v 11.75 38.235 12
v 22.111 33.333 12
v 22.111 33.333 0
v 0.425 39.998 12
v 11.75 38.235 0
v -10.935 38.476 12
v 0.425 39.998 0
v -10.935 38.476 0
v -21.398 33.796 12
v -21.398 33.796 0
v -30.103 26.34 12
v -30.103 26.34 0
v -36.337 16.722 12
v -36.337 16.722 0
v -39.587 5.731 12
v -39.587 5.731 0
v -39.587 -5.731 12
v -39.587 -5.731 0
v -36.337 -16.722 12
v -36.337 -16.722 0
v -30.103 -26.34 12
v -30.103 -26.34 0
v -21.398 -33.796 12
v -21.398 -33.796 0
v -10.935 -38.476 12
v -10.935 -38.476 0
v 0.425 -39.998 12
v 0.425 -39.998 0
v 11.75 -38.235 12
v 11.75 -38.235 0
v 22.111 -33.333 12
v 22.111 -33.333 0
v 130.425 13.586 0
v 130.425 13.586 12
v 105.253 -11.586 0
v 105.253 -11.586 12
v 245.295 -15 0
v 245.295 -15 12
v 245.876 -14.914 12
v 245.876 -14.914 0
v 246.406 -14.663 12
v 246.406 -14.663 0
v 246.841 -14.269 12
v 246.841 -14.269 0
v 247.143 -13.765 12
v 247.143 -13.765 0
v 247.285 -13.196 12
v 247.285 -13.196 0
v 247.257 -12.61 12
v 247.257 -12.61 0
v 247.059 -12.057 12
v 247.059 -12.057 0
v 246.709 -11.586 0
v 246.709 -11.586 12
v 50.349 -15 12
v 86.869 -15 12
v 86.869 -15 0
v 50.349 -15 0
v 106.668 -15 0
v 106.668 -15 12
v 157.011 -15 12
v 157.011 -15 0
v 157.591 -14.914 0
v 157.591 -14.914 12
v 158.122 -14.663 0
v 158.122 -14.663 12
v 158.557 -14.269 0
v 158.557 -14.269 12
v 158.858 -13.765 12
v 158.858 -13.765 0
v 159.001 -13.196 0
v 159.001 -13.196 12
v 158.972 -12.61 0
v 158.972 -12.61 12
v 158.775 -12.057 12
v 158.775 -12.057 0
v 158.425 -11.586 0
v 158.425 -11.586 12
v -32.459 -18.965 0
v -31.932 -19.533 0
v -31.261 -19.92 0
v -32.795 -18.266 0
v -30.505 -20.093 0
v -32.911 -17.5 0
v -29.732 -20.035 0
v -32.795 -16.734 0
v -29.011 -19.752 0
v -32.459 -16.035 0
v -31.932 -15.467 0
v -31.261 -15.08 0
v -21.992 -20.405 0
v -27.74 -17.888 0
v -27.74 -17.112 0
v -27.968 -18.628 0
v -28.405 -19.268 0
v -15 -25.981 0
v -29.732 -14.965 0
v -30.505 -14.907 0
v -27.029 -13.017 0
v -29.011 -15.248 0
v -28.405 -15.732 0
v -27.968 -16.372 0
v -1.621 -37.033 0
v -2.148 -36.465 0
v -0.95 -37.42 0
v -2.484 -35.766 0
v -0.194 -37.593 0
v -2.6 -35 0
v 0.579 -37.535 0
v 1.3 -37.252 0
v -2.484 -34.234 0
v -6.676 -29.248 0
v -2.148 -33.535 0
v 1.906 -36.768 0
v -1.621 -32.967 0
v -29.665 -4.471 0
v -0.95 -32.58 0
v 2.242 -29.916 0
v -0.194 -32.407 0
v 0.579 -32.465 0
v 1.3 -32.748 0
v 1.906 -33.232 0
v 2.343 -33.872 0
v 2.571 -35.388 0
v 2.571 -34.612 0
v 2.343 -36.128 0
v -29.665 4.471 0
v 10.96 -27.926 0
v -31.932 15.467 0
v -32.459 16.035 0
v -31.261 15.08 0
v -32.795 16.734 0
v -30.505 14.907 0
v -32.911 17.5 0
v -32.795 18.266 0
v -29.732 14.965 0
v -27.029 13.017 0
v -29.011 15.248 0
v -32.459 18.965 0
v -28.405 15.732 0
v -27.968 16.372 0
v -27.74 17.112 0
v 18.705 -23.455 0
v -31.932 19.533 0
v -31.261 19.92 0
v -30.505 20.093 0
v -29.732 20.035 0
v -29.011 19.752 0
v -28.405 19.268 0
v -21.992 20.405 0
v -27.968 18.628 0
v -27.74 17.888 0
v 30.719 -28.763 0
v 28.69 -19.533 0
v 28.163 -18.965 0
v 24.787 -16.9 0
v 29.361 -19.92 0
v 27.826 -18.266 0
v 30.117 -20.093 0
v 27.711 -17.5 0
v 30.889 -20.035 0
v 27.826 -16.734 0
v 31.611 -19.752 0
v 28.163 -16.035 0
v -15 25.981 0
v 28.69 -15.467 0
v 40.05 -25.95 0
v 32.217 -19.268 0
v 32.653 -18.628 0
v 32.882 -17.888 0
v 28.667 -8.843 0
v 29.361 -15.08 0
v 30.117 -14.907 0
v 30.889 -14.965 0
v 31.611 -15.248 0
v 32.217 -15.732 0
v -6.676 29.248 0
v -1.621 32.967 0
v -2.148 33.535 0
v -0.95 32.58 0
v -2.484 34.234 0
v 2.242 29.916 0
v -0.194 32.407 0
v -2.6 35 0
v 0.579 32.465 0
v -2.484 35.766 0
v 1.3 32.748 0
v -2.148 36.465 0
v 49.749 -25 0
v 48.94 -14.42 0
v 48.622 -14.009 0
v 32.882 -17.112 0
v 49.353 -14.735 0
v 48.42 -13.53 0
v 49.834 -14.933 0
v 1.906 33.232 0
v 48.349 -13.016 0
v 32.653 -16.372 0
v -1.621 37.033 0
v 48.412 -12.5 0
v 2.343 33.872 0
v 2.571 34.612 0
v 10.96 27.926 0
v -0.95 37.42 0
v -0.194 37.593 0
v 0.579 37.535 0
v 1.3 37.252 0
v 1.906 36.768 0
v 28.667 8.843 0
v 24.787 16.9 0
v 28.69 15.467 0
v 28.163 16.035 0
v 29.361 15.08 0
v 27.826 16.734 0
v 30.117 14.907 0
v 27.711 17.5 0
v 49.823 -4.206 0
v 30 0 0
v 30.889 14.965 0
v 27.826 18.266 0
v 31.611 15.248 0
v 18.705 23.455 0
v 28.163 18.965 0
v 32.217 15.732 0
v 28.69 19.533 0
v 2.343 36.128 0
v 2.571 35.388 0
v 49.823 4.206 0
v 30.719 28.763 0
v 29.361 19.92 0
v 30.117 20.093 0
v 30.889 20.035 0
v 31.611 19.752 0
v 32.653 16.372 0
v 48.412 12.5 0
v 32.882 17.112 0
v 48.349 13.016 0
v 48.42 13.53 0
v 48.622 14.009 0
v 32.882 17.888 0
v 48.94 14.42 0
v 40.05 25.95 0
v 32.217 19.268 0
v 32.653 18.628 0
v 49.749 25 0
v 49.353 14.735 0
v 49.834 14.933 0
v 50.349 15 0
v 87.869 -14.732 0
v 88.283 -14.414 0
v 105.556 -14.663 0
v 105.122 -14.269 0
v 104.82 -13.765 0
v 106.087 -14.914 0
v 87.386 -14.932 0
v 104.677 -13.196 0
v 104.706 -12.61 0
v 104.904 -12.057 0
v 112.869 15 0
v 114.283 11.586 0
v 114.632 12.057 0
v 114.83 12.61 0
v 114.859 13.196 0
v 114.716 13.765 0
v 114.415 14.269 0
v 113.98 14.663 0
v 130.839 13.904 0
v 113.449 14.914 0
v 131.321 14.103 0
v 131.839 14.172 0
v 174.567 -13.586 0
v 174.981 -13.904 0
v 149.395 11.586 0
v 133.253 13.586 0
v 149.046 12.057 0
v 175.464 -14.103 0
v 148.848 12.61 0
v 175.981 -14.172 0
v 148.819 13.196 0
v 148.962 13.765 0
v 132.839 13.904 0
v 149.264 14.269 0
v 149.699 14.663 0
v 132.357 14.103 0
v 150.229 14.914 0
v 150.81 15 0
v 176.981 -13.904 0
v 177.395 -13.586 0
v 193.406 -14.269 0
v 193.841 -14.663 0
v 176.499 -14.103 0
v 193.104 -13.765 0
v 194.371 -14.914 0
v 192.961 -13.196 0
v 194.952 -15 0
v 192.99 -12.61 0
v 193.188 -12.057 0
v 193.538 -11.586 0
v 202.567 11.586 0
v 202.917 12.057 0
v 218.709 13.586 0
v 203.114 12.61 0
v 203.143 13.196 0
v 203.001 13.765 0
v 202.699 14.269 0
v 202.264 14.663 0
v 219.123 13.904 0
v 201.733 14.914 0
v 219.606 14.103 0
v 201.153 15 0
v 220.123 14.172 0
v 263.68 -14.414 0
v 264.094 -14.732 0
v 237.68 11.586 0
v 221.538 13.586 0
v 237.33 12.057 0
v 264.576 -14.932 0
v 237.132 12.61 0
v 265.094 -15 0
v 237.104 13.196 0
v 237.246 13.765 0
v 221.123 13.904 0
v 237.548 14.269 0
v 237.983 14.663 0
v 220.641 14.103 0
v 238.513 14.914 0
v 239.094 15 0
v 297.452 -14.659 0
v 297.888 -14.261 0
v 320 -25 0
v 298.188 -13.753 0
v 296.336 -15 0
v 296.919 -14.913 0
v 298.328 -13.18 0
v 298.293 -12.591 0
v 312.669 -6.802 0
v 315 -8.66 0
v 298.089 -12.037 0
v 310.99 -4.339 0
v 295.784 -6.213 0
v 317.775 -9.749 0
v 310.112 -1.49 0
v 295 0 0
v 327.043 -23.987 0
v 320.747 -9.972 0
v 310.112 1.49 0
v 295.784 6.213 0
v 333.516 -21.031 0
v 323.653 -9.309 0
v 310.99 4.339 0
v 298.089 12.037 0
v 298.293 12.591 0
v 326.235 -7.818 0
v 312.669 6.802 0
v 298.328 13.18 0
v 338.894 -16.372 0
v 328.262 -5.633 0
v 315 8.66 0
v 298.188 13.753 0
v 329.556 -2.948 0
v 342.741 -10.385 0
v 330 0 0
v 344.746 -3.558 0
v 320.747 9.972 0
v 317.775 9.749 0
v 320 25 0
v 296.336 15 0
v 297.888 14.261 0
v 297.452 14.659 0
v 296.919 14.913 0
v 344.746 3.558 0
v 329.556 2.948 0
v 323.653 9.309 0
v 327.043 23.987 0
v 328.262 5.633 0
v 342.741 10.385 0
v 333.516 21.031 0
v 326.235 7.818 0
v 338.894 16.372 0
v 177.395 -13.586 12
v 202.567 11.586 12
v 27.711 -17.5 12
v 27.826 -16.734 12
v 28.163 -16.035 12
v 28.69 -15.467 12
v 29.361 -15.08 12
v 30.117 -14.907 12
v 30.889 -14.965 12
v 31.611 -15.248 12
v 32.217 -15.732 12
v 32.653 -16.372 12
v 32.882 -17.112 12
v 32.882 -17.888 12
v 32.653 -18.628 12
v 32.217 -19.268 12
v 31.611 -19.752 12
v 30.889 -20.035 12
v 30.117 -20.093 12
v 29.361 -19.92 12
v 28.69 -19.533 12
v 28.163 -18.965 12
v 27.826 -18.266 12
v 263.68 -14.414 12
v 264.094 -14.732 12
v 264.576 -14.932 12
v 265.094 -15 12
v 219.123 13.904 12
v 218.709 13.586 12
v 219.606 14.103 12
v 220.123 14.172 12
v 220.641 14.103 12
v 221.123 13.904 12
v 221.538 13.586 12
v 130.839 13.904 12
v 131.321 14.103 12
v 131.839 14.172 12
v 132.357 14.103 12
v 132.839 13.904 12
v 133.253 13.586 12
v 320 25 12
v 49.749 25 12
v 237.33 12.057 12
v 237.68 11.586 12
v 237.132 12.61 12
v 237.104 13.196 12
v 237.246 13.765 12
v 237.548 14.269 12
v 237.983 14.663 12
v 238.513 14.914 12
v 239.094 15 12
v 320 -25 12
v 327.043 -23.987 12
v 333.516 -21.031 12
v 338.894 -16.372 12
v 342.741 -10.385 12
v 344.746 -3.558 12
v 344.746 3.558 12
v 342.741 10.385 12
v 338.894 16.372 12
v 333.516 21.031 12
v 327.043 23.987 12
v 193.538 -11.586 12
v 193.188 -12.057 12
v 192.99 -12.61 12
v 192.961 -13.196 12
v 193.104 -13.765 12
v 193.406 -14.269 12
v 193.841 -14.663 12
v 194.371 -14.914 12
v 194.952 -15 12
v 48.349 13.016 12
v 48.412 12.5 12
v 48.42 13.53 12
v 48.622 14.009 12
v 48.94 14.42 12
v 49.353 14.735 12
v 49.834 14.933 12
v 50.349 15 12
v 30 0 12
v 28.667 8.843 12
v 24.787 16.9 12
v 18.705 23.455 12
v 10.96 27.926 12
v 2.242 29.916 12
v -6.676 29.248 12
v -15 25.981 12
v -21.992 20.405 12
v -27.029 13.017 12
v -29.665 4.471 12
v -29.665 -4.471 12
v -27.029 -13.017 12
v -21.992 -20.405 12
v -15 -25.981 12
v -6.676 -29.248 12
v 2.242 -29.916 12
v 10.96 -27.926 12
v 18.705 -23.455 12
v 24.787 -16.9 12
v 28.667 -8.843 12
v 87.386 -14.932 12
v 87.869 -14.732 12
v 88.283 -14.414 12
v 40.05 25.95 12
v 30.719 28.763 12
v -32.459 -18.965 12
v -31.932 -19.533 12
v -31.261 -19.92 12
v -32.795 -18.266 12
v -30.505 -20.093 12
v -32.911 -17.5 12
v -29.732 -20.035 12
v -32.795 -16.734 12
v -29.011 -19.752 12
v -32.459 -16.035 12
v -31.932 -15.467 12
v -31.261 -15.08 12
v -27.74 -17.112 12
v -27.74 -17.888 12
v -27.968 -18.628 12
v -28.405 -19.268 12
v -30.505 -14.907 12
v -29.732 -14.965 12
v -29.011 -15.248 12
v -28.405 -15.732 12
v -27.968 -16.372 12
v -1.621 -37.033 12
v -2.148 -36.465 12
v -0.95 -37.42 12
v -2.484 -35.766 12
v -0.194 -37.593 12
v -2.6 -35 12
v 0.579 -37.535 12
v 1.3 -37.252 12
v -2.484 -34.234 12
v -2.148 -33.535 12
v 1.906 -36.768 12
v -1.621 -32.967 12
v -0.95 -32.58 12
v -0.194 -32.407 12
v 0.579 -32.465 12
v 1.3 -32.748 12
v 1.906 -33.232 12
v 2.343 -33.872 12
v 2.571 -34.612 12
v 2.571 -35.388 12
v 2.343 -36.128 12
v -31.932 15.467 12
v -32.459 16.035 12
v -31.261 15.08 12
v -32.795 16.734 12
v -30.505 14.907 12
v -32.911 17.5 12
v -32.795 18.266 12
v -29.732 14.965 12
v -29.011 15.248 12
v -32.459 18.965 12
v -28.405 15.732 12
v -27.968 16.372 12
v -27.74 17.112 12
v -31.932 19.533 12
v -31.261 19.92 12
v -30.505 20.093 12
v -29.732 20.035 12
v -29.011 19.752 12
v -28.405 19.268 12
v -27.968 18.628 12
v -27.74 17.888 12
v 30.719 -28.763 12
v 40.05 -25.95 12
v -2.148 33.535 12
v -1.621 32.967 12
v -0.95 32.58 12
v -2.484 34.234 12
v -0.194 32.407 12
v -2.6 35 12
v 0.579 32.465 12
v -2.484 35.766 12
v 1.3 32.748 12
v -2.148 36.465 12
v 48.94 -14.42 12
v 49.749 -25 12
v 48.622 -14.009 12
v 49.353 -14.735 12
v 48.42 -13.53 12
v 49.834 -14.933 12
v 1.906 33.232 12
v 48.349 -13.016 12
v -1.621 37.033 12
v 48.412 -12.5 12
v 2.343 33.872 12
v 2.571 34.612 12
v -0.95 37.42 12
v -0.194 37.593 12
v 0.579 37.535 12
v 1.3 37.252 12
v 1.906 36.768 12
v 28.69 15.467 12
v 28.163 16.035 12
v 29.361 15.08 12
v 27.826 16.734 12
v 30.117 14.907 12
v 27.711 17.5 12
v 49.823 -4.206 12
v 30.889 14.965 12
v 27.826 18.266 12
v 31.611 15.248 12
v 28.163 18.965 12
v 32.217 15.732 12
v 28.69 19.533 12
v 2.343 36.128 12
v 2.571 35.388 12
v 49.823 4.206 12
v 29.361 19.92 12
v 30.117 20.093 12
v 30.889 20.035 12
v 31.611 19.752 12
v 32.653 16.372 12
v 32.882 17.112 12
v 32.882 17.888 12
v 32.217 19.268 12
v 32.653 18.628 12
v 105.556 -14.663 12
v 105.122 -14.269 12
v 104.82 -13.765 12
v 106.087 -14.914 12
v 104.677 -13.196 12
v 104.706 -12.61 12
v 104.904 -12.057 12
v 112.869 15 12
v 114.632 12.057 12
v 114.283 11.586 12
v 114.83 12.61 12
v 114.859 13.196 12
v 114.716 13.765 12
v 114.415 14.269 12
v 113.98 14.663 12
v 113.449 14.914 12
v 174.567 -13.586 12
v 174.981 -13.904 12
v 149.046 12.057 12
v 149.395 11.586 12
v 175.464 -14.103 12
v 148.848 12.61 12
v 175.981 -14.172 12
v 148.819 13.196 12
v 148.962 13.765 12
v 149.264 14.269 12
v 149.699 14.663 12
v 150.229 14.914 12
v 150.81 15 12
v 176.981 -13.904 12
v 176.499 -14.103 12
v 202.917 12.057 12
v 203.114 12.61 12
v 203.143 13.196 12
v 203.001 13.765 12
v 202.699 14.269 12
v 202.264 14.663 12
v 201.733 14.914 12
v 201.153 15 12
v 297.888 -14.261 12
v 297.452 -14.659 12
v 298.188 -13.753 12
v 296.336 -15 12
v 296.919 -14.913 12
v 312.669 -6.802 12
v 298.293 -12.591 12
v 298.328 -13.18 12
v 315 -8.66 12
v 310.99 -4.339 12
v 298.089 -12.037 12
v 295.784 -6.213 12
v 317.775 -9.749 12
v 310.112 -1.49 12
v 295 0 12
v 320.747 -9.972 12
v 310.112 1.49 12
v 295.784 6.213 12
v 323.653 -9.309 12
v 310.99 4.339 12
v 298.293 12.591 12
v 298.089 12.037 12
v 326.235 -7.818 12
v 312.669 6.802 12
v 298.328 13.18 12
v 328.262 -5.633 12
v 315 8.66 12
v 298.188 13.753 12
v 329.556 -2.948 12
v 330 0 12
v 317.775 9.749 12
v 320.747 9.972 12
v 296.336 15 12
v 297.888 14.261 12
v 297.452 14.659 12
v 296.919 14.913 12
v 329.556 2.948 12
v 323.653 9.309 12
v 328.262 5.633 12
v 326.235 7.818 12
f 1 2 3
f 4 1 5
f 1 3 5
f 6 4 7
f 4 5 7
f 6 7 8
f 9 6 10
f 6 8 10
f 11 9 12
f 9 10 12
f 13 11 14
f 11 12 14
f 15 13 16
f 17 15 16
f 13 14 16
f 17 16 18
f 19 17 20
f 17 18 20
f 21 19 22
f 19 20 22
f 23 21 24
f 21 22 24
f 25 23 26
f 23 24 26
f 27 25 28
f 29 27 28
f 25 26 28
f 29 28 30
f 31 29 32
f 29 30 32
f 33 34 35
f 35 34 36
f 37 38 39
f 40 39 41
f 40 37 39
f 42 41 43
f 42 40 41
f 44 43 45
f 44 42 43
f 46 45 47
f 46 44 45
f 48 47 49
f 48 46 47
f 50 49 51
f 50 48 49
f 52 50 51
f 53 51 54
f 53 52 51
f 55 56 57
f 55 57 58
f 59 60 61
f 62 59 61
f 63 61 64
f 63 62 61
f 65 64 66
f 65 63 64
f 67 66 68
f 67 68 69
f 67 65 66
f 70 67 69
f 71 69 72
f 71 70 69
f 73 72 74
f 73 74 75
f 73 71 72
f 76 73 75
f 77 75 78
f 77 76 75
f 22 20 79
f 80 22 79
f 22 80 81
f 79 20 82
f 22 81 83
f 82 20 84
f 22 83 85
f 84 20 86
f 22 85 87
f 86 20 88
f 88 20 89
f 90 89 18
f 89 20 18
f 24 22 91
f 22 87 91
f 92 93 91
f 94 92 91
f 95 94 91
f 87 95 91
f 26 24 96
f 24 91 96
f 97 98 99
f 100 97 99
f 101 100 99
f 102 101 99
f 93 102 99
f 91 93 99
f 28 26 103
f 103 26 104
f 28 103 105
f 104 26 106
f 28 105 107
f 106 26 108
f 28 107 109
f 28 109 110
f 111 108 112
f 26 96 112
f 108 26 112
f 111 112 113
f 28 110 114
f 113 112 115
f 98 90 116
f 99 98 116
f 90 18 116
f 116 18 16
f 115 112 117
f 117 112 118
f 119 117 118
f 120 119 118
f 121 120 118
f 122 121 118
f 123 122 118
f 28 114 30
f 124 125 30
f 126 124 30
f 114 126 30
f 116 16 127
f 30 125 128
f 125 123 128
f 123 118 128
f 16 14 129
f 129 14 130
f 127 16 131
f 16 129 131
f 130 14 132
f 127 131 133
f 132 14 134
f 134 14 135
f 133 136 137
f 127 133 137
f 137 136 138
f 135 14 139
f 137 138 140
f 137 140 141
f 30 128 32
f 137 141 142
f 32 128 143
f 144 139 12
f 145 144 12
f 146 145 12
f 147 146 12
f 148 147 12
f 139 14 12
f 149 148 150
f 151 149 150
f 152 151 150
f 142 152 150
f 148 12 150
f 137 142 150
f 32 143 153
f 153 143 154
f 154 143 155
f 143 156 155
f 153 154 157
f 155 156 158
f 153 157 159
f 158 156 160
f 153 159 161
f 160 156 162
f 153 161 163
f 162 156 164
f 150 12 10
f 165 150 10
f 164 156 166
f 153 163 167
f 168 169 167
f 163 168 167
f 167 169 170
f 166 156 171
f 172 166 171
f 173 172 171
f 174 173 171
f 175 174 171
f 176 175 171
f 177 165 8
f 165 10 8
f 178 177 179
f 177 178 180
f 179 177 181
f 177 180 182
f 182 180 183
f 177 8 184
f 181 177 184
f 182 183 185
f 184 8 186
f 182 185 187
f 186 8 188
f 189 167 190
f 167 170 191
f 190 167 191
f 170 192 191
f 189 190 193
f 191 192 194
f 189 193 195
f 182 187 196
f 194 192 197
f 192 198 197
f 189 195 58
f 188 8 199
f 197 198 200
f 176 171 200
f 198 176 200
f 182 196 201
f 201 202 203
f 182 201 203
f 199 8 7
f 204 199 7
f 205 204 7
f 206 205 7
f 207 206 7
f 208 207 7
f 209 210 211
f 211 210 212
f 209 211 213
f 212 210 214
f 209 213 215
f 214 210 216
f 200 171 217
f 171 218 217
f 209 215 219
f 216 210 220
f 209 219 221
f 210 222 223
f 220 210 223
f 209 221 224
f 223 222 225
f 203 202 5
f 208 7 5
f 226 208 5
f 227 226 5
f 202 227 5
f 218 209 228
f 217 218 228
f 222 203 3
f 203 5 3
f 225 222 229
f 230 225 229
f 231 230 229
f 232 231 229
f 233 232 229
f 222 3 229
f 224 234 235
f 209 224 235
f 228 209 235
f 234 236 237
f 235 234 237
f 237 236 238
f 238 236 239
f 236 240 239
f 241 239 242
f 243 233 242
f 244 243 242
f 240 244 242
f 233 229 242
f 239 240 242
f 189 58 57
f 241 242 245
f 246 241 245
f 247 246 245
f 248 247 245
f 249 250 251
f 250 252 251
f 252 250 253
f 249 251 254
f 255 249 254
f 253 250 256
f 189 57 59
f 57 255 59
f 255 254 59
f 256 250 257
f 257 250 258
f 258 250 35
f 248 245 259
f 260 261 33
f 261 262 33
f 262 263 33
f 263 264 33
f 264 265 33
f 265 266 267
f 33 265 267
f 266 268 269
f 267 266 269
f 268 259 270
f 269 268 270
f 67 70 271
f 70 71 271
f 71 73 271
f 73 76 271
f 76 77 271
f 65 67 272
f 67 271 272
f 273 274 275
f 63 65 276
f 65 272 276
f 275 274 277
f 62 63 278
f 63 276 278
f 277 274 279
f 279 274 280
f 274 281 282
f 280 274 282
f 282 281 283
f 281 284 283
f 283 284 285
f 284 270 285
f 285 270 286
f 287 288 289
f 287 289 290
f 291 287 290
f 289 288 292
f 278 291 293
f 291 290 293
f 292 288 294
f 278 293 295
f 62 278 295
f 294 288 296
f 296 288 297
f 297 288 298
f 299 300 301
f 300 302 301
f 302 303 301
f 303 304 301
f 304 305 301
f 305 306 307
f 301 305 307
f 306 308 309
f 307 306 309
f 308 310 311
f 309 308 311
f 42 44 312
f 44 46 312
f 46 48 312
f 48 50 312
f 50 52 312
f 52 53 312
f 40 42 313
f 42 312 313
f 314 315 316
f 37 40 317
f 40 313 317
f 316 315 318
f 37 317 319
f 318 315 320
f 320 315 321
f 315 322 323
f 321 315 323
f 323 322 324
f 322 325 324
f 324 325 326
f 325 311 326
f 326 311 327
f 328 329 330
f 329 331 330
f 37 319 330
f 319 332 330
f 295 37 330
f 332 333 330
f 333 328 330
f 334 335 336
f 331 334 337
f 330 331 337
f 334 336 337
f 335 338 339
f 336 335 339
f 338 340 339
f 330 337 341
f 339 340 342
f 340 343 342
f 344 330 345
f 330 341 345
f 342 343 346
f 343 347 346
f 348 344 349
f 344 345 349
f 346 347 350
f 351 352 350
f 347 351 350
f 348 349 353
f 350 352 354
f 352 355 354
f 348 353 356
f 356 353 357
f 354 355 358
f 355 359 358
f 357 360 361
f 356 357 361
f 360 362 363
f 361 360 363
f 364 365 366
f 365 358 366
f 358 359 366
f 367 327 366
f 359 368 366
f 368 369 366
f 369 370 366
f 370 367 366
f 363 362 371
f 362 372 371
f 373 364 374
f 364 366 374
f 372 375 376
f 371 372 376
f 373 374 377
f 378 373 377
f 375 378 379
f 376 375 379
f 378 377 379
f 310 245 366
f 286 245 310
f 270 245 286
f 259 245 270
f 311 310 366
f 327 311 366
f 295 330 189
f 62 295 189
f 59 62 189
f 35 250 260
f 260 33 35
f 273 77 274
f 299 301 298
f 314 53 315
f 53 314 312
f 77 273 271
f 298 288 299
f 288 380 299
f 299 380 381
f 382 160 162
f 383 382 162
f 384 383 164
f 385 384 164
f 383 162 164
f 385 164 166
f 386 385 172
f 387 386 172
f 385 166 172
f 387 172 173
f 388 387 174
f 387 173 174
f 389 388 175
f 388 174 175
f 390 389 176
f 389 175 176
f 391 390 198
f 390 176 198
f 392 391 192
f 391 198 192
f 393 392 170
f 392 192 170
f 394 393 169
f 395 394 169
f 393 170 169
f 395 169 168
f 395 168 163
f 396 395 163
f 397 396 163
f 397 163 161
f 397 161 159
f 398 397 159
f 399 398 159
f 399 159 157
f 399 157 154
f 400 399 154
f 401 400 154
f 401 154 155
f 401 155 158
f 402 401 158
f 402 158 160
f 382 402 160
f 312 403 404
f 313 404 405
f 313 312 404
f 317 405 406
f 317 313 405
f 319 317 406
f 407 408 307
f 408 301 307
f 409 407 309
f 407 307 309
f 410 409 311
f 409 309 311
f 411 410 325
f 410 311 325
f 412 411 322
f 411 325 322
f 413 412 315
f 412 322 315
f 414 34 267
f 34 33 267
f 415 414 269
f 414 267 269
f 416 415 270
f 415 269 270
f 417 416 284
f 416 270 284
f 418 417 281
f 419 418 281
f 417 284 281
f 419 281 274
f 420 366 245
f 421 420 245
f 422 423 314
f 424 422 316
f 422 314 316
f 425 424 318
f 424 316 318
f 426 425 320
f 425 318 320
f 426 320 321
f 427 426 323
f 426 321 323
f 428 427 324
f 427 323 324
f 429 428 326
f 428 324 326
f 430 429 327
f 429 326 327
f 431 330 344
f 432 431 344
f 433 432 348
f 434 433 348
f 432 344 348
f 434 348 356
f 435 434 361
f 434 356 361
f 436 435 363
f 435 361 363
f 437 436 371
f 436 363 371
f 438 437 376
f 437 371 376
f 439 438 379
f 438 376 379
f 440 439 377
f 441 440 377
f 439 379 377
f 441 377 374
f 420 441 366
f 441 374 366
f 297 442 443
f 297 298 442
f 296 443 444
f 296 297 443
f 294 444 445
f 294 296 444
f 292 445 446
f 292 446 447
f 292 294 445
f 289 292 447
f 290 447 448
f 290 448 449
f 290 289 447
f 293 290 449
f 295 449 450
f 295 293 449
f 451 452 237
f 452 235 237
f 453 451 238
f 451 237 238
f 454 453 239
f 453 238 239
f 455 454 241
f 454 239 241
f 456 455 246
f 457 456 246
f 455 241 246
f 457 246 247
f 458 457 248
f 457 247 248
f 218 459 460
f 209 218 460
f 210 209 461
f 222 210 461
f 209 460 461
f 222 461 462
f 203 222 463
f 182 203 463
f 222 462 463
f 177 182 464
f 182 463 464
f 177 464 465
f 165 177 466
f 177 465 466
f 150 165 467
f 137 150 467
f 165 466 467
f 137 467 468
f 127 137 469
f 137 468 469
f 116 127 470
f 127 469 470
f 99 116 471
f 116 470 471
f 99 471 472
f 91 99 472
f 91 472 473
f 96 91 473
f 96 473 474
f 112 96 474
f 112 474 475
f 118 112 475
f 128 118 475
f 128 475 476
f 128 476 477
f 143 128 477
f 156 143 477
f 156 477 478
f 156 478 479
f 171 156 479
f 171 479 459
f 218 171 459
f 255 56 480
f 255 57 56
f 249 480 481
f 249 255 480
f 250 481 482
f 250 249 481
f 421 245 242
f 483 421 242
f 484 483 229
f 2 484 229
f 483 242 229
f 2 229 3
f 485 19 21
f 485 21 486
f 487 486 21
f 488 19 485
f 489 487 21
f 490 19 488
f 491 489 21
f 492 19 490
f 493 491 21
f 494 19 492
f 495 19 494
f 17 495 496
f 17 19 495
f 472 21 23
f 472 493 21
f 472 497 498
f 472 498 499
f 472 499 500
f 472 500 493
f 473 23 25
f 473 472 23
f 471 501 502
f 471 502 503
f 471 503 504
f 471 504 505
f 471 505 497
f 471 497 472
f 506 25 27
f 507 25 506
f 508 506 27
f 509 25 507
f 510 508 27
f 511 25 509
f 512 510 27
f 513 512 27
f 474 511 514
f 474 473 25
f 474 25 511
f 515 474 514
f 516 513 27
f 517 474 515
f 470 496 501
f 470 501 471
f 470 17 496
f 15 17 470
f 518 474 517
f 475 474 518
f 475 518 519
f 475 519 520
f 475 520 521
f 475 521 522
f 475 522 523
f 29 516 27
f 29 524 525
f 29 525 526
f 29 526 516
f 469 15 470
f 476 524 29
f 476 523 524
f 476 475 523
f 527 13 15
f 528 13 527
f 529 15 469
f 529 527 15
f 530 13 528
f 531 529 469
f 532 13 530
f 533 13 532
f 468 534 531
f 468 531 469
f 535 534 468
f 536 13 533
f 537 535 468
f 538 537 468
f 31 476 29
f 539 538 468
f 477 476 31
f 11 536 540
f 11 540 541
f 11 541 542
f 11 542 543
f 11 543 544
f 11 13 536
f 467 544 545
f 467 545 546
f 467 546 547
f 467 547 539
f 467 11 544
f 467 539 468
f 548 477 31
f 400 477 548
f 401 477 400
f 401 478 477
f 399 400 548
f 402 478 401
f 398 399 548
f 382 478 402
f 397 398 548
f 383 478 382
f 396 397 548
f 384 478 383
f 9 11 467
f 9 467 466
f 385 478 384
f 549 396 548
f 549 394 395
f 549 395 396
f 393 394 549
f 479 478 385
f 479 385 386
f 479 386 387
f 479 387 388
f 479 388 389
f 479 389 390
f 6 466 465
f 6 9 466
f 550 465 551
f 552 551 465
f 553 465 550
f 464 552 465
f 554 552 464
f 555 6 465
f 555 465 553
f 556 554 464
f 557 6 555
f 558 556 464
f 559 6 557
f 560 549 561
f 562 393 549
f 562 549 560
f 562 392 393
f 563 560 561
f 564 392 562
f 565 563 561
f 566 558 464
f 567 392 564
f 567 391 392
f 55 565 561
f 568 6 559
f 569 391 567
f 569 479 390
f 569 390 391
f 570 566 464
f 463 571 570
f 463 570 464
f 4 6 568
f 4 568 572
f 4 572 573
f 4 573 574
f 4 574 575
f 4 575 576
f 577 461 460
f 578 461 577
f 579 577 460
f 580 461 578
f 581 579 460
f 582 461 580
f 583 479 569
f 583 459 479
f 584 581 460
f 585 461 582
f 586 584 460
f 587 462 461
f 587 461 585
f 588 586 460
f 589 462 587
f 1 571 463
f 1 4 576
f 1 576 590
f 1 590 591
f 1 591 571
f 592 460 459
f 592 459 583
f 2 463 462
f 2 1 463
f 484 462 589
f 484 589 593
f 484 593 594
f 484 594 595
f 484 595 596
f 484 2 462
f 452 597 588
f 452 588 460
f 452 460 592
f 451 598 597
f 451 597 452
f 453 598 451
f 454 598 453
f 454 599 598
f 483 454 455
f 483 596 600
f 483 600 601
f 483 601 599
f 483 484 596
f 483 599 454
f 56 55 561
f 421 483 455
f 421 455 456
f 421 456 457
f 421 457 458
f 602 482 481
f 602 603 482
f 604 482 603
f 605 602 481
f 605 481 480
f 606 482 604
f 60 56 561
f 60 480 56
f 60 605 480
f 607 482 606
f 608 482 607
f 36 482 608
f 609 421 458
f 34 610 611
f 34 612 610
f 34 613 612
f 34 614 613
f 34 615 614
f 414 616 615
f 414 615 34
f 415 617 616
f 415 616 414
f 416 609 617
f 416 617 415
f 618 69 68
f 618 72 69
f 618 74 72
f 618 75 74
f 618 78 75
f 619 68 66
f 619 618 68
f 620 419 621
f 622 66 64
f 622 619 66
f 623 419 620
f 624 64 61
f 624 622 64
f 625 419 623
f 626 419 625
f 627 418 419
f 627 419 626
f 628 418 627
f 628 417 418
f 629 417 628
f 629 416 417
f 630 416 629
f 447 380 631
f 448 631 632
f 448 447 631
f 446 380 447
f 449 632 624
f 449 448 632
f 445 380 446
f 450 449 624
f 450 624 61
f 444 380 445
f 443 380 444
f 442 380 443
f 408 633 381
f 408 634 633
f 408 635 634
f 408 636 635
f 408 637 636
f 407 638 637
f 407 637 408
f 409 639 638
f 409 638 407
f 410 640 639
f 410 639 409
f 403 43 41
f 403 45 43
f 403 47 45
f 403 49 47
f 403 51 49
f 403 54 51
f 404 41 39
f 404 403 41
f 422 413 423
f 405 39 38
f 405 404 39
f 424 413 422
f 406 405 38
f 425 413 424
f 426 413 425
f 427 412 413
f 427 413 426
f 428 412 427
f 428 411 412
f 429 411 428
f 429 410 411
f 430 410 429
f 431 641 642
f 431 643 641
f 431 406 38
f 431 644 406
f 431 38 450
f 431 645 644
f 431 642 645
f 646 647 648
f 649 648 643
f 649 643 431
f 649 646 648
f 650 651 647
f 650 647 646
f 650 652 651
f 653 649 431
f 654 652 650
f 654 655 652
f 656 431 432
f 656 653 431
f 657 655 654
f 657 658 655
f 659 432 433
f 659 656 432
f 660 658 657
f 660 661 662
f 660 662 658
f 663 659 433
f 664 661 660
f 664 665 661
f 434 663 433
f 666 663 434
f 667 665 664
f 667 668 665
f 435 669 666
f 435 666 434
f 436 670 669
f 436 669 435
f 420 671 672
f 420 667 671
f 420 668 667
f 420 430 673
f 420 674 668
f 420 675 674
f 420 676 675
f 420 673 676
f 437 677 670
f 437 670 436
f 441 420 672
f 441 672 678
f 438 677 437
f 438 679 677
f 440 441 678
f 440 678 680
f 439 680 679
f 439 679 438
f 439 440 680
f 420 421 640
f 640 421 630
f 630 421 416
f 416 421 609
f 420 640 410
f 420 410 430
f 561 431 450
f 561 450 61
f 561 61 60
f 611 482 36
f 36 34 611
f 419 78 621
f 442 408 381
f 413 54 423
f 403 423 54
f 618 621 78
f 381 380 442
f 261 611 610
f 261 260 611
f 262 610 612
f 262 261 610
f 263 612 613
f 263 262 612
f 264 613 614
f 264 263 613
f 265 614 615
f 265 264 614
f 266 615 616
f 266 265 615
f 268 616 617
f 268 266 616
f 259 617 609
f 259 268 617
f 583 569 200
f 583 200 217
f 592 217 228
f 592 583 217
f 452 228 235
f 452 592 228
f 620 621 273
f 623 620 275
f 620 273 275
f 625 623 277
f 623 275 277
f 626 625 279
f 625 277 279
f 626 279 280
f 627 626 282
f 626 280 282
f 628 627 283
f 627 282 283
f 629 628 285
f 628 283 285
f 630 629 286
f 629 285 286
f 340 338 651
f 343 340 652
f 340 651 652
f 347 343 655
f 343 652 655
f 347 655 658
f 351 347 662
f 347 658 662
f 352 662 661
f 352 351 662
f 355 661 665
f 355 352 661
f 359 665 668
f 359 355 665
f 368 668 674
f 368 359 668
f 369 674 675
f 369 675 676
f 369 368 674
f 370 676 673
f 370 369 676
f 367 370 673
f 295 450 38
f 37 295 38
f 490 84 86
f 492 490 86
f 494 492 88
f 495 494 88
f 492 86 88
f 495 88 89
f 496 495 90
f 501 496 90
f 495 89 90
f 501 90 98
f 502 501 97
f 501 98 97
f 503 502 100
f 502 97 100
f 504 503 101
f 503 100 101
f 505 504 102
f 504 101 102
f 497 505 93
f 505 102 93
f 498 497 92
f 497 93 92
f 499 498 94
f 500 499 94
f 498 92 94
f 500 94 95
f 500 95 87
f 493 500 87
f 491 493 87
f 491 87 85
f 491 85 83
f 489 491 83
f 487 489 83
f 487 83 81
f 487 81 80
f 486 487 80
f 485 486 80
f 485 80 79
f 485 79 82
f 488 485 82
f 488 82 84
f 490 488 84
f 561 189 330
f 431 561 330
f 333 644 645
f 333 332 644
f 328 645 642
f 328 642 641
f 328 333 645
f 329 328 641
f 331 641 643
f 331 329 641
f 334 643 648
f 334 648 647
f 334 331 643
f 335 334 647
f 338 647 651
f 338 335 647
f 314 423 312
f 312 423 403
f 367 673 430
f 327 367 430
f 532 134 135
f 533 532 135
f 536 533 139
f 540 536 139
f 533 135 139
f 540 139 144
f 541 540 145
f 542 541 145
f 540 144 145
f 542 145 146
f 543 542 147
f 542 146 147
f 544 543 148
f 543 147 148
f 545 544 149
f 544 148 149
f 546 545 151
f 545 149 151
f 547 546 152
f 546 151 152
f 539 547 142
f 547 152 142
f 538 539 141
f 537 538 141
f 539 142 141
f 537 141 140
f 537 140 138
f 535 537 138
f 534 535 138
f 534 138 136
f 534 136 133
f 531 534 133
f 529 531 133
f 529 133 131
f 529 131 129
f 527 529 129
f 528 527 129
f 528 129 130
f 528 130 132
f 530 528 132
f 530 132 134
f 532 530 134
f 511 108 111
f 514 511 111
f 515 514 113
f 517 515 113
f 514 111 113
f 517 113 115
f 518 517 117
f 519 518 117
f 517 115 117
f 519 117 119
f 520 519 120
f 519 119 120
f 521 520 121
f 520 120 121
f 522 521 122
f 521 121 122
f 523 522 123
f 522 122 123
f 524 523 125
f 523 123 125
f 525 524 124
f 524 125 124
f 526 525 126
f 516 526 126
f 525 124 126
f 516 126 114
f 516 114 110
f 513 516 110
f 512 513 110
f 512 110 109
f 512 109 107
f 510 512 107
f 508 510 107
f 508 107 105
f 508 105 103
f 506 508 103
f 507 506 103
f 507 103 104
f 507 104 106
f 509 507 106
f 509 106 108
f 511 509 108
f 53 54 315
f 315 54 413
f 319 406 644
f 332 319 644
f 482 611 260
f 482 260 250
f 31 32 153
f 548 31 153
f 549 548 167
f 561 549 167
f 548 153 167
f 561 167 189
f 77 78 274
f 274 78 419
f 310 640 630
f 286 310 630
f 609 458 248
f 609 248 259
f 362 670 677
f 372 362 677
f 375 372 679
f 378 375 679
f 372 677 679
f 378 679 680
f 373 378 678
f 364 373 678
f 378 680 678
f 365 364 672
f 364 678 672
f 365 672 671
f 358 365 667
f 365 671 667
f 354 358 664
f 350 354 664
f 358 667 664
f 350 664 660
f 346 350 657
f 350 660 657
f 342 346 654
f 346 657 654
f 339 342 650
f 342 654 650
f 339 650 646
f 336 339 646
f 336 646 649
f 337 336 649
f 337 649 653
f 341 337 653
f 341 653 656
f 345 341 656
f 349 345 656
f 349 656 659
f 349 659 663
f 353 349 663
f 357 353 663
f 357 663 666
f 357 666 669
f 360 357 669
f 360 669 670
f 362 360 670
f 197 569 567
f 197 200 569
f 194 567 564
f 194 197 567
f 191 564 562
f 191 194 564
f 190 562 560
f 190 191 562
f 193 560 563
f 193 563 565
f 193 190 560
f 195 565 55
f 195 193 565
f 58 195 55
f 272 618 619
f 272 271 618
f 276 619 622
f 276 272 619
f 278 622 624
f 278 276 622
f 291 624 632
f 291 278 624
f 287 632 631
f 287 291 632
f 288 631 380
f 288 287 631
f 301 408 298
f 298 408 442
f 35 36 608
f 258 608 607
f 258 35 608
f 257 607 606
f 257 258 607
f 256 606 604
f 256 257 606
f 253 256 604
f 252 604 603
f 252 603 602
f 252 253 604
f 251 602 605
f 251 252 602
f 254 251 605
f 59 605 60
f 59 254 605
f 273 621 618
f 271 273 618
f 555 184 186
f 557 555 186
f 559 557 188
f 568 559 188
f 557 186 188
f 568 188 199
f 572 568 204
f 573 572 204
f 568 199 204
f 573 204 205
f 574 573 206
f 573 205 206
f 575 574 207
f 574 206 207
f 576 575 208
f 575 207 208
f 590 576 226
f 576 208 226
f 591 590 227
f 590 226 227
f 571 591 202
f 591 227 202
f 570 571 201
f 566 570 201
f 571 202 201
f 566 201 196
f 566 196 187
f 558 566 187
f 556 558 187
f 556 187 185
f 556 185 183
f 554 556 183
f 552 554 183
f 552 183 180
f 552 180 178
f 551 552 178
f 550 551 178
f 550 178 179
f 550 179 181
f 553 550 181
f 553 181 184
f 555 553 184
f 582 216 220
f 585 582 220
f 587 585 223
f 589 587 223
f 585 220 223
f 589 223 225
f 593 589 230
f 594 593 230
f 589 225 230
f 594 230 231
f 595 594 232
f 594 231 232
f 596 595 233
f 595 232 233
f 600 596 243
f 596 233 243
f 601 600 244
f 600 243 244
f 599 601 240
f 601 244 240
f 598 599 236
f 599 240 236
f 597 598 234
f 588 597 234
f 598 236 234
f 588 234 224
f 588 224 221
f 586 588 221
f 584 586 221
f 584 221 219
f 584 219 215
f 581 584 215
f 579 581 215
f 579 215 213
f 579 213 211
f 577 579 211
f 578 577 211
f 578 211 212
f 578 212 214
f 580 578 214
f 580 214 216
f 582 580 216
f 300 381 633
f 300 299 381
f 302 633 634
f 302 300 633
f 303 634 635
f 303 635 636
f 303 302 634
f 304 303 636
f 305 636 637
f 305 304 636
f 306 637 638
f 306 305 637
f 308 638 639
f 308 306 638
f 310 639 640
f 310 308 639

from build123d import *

# Parameters (mm, degrees)
EXTRUDE_1_DEPTH         = 12
SKETCH_5_R              = 30
SKETCH_5_R_2            = 10
CUT_EXTRUDE_1_DEPTH     = 348.51834484
CUT_EXTRUDE_3_DEPTH     = 348.51834484
FILLET_1_R              = 2
HOLE_WIZARD_5_2_5_2_1_D = 5.2


with BuildPart() as part:
    # 草图1 → 凸台-拉伸1 (new body)
    with BuildSketch(Plane.XY):
        with BuildLine():
            Line((320, 25), (49.749371855, 25))
            ThreePointArc((49.749371855, 25), (35.315615126, 27.128644612), (22.110831936, 33.333333333))
            ThreePointArc((22.110831936, 33.333333333), (-40, 0), (22.110831936, -33.333333333))
            ThreePointArc((22.110831936, -33.333333333), (35.315615126, -27.128644612), (49.749371855, -25))
            Line((49.749371855, -25), (320, -25))
            ThreePointArc((320, -25), (345, 0), (320, 25))
        make_face()
    extrude(amount=EXTRUDE_1_DEPTH)

    # 草图5 → 切除-拉伸1 (cut, through all)
    with BuildSketch(Plane.XY.offset(12)):
        Circle(SKETCH_5_R)
        with Locations((320, 0)):
            Circle(SKETCH_5_R_2)
    extrude(amount=-CUT_EXTRUDE_1_DEPTH, mode=Mode.SUBTRACT)

    # 草图6 → 切除-拉伸3 (cut, through all)
    with BuildSketch(Plane.XY.offset(12)):
        with BuildLine():
            Line((47.696960071, 15), (117.696960071, 15))
            Line((117.696960071, 15), (87.696960071, -15))
            Line((87.696960071, -15), (47.696960071, -15))
            ThreePointArc((47.696960071, -15), (50, 0), (47.696960071, 15))
        make_face()
        Polygon((131.839095695, 15), (101.839095695, -15), (161.839095695, -15), align=None)
        Polygon((145.981231318, 15), (175.981231318, -15), (205.981231318, 15), align=None)
        Polygon((220.123366942, 15), (190.123366942, -15), (250.123366942, -15), align=None)
        with BuildLine():
            Line((234.265502566, 15), (264.265502566, -15))
            Line((264.265502566, -15), (300, -15))
            ThreePointArc((300, -15), (295, 0), (300, 15))
            Line((300, 15), (234.265502566, 15))
        make_face()
    extrude(amount=-CUT_EXTRUDE_3_DEPTH, mode=Mode.SUBTRACT)

    # 圆角1
    fillet_1_edges = [part.edges().sort_by_distance(p)[0] for p in [
        (117.696960071, 15, 6),
        (87.696960071, -15, 6),
        (47.696960071, -15, 6),
        (47.696960071, 15, 6),
        (145.981231318, 15, 6),
        (205.981231318, 15, 6),
        (175.981231318, -15, 6),
        (300, 15, 6),
        (300, -15, 6),
        (264.265502566, -15, 6),
        (234.265502566, 15, 6),
        (220.123366942, 15, 6),
        (250.123366942, -15, 6),
        (190.123366942, -15, 6),
        (131.839095695, 15, 6),
        (161.839095695, -15, 6),
        (101.839095695, -15, 6),
    ]]
    fillet(fillet_1_edges, radius=FILLET_1_R)

    # Ø5.2 (5.2) 直径孔1 (through all)
    with Locations(Plane(origin=(0, 35, 12), x_dir=(1, 0, 0), z_dir=(0, 0, 1))):
        with Locations((0, 0), (-30.310889132, -17.5), (-30.310889132, -52.5), (0, -70), (30.310889132, -52.5), (30.310889132, -17.5)):
            Hole(HOLE_WIZARD_5_2_5_2_1_D / 2)


solid = part.part
